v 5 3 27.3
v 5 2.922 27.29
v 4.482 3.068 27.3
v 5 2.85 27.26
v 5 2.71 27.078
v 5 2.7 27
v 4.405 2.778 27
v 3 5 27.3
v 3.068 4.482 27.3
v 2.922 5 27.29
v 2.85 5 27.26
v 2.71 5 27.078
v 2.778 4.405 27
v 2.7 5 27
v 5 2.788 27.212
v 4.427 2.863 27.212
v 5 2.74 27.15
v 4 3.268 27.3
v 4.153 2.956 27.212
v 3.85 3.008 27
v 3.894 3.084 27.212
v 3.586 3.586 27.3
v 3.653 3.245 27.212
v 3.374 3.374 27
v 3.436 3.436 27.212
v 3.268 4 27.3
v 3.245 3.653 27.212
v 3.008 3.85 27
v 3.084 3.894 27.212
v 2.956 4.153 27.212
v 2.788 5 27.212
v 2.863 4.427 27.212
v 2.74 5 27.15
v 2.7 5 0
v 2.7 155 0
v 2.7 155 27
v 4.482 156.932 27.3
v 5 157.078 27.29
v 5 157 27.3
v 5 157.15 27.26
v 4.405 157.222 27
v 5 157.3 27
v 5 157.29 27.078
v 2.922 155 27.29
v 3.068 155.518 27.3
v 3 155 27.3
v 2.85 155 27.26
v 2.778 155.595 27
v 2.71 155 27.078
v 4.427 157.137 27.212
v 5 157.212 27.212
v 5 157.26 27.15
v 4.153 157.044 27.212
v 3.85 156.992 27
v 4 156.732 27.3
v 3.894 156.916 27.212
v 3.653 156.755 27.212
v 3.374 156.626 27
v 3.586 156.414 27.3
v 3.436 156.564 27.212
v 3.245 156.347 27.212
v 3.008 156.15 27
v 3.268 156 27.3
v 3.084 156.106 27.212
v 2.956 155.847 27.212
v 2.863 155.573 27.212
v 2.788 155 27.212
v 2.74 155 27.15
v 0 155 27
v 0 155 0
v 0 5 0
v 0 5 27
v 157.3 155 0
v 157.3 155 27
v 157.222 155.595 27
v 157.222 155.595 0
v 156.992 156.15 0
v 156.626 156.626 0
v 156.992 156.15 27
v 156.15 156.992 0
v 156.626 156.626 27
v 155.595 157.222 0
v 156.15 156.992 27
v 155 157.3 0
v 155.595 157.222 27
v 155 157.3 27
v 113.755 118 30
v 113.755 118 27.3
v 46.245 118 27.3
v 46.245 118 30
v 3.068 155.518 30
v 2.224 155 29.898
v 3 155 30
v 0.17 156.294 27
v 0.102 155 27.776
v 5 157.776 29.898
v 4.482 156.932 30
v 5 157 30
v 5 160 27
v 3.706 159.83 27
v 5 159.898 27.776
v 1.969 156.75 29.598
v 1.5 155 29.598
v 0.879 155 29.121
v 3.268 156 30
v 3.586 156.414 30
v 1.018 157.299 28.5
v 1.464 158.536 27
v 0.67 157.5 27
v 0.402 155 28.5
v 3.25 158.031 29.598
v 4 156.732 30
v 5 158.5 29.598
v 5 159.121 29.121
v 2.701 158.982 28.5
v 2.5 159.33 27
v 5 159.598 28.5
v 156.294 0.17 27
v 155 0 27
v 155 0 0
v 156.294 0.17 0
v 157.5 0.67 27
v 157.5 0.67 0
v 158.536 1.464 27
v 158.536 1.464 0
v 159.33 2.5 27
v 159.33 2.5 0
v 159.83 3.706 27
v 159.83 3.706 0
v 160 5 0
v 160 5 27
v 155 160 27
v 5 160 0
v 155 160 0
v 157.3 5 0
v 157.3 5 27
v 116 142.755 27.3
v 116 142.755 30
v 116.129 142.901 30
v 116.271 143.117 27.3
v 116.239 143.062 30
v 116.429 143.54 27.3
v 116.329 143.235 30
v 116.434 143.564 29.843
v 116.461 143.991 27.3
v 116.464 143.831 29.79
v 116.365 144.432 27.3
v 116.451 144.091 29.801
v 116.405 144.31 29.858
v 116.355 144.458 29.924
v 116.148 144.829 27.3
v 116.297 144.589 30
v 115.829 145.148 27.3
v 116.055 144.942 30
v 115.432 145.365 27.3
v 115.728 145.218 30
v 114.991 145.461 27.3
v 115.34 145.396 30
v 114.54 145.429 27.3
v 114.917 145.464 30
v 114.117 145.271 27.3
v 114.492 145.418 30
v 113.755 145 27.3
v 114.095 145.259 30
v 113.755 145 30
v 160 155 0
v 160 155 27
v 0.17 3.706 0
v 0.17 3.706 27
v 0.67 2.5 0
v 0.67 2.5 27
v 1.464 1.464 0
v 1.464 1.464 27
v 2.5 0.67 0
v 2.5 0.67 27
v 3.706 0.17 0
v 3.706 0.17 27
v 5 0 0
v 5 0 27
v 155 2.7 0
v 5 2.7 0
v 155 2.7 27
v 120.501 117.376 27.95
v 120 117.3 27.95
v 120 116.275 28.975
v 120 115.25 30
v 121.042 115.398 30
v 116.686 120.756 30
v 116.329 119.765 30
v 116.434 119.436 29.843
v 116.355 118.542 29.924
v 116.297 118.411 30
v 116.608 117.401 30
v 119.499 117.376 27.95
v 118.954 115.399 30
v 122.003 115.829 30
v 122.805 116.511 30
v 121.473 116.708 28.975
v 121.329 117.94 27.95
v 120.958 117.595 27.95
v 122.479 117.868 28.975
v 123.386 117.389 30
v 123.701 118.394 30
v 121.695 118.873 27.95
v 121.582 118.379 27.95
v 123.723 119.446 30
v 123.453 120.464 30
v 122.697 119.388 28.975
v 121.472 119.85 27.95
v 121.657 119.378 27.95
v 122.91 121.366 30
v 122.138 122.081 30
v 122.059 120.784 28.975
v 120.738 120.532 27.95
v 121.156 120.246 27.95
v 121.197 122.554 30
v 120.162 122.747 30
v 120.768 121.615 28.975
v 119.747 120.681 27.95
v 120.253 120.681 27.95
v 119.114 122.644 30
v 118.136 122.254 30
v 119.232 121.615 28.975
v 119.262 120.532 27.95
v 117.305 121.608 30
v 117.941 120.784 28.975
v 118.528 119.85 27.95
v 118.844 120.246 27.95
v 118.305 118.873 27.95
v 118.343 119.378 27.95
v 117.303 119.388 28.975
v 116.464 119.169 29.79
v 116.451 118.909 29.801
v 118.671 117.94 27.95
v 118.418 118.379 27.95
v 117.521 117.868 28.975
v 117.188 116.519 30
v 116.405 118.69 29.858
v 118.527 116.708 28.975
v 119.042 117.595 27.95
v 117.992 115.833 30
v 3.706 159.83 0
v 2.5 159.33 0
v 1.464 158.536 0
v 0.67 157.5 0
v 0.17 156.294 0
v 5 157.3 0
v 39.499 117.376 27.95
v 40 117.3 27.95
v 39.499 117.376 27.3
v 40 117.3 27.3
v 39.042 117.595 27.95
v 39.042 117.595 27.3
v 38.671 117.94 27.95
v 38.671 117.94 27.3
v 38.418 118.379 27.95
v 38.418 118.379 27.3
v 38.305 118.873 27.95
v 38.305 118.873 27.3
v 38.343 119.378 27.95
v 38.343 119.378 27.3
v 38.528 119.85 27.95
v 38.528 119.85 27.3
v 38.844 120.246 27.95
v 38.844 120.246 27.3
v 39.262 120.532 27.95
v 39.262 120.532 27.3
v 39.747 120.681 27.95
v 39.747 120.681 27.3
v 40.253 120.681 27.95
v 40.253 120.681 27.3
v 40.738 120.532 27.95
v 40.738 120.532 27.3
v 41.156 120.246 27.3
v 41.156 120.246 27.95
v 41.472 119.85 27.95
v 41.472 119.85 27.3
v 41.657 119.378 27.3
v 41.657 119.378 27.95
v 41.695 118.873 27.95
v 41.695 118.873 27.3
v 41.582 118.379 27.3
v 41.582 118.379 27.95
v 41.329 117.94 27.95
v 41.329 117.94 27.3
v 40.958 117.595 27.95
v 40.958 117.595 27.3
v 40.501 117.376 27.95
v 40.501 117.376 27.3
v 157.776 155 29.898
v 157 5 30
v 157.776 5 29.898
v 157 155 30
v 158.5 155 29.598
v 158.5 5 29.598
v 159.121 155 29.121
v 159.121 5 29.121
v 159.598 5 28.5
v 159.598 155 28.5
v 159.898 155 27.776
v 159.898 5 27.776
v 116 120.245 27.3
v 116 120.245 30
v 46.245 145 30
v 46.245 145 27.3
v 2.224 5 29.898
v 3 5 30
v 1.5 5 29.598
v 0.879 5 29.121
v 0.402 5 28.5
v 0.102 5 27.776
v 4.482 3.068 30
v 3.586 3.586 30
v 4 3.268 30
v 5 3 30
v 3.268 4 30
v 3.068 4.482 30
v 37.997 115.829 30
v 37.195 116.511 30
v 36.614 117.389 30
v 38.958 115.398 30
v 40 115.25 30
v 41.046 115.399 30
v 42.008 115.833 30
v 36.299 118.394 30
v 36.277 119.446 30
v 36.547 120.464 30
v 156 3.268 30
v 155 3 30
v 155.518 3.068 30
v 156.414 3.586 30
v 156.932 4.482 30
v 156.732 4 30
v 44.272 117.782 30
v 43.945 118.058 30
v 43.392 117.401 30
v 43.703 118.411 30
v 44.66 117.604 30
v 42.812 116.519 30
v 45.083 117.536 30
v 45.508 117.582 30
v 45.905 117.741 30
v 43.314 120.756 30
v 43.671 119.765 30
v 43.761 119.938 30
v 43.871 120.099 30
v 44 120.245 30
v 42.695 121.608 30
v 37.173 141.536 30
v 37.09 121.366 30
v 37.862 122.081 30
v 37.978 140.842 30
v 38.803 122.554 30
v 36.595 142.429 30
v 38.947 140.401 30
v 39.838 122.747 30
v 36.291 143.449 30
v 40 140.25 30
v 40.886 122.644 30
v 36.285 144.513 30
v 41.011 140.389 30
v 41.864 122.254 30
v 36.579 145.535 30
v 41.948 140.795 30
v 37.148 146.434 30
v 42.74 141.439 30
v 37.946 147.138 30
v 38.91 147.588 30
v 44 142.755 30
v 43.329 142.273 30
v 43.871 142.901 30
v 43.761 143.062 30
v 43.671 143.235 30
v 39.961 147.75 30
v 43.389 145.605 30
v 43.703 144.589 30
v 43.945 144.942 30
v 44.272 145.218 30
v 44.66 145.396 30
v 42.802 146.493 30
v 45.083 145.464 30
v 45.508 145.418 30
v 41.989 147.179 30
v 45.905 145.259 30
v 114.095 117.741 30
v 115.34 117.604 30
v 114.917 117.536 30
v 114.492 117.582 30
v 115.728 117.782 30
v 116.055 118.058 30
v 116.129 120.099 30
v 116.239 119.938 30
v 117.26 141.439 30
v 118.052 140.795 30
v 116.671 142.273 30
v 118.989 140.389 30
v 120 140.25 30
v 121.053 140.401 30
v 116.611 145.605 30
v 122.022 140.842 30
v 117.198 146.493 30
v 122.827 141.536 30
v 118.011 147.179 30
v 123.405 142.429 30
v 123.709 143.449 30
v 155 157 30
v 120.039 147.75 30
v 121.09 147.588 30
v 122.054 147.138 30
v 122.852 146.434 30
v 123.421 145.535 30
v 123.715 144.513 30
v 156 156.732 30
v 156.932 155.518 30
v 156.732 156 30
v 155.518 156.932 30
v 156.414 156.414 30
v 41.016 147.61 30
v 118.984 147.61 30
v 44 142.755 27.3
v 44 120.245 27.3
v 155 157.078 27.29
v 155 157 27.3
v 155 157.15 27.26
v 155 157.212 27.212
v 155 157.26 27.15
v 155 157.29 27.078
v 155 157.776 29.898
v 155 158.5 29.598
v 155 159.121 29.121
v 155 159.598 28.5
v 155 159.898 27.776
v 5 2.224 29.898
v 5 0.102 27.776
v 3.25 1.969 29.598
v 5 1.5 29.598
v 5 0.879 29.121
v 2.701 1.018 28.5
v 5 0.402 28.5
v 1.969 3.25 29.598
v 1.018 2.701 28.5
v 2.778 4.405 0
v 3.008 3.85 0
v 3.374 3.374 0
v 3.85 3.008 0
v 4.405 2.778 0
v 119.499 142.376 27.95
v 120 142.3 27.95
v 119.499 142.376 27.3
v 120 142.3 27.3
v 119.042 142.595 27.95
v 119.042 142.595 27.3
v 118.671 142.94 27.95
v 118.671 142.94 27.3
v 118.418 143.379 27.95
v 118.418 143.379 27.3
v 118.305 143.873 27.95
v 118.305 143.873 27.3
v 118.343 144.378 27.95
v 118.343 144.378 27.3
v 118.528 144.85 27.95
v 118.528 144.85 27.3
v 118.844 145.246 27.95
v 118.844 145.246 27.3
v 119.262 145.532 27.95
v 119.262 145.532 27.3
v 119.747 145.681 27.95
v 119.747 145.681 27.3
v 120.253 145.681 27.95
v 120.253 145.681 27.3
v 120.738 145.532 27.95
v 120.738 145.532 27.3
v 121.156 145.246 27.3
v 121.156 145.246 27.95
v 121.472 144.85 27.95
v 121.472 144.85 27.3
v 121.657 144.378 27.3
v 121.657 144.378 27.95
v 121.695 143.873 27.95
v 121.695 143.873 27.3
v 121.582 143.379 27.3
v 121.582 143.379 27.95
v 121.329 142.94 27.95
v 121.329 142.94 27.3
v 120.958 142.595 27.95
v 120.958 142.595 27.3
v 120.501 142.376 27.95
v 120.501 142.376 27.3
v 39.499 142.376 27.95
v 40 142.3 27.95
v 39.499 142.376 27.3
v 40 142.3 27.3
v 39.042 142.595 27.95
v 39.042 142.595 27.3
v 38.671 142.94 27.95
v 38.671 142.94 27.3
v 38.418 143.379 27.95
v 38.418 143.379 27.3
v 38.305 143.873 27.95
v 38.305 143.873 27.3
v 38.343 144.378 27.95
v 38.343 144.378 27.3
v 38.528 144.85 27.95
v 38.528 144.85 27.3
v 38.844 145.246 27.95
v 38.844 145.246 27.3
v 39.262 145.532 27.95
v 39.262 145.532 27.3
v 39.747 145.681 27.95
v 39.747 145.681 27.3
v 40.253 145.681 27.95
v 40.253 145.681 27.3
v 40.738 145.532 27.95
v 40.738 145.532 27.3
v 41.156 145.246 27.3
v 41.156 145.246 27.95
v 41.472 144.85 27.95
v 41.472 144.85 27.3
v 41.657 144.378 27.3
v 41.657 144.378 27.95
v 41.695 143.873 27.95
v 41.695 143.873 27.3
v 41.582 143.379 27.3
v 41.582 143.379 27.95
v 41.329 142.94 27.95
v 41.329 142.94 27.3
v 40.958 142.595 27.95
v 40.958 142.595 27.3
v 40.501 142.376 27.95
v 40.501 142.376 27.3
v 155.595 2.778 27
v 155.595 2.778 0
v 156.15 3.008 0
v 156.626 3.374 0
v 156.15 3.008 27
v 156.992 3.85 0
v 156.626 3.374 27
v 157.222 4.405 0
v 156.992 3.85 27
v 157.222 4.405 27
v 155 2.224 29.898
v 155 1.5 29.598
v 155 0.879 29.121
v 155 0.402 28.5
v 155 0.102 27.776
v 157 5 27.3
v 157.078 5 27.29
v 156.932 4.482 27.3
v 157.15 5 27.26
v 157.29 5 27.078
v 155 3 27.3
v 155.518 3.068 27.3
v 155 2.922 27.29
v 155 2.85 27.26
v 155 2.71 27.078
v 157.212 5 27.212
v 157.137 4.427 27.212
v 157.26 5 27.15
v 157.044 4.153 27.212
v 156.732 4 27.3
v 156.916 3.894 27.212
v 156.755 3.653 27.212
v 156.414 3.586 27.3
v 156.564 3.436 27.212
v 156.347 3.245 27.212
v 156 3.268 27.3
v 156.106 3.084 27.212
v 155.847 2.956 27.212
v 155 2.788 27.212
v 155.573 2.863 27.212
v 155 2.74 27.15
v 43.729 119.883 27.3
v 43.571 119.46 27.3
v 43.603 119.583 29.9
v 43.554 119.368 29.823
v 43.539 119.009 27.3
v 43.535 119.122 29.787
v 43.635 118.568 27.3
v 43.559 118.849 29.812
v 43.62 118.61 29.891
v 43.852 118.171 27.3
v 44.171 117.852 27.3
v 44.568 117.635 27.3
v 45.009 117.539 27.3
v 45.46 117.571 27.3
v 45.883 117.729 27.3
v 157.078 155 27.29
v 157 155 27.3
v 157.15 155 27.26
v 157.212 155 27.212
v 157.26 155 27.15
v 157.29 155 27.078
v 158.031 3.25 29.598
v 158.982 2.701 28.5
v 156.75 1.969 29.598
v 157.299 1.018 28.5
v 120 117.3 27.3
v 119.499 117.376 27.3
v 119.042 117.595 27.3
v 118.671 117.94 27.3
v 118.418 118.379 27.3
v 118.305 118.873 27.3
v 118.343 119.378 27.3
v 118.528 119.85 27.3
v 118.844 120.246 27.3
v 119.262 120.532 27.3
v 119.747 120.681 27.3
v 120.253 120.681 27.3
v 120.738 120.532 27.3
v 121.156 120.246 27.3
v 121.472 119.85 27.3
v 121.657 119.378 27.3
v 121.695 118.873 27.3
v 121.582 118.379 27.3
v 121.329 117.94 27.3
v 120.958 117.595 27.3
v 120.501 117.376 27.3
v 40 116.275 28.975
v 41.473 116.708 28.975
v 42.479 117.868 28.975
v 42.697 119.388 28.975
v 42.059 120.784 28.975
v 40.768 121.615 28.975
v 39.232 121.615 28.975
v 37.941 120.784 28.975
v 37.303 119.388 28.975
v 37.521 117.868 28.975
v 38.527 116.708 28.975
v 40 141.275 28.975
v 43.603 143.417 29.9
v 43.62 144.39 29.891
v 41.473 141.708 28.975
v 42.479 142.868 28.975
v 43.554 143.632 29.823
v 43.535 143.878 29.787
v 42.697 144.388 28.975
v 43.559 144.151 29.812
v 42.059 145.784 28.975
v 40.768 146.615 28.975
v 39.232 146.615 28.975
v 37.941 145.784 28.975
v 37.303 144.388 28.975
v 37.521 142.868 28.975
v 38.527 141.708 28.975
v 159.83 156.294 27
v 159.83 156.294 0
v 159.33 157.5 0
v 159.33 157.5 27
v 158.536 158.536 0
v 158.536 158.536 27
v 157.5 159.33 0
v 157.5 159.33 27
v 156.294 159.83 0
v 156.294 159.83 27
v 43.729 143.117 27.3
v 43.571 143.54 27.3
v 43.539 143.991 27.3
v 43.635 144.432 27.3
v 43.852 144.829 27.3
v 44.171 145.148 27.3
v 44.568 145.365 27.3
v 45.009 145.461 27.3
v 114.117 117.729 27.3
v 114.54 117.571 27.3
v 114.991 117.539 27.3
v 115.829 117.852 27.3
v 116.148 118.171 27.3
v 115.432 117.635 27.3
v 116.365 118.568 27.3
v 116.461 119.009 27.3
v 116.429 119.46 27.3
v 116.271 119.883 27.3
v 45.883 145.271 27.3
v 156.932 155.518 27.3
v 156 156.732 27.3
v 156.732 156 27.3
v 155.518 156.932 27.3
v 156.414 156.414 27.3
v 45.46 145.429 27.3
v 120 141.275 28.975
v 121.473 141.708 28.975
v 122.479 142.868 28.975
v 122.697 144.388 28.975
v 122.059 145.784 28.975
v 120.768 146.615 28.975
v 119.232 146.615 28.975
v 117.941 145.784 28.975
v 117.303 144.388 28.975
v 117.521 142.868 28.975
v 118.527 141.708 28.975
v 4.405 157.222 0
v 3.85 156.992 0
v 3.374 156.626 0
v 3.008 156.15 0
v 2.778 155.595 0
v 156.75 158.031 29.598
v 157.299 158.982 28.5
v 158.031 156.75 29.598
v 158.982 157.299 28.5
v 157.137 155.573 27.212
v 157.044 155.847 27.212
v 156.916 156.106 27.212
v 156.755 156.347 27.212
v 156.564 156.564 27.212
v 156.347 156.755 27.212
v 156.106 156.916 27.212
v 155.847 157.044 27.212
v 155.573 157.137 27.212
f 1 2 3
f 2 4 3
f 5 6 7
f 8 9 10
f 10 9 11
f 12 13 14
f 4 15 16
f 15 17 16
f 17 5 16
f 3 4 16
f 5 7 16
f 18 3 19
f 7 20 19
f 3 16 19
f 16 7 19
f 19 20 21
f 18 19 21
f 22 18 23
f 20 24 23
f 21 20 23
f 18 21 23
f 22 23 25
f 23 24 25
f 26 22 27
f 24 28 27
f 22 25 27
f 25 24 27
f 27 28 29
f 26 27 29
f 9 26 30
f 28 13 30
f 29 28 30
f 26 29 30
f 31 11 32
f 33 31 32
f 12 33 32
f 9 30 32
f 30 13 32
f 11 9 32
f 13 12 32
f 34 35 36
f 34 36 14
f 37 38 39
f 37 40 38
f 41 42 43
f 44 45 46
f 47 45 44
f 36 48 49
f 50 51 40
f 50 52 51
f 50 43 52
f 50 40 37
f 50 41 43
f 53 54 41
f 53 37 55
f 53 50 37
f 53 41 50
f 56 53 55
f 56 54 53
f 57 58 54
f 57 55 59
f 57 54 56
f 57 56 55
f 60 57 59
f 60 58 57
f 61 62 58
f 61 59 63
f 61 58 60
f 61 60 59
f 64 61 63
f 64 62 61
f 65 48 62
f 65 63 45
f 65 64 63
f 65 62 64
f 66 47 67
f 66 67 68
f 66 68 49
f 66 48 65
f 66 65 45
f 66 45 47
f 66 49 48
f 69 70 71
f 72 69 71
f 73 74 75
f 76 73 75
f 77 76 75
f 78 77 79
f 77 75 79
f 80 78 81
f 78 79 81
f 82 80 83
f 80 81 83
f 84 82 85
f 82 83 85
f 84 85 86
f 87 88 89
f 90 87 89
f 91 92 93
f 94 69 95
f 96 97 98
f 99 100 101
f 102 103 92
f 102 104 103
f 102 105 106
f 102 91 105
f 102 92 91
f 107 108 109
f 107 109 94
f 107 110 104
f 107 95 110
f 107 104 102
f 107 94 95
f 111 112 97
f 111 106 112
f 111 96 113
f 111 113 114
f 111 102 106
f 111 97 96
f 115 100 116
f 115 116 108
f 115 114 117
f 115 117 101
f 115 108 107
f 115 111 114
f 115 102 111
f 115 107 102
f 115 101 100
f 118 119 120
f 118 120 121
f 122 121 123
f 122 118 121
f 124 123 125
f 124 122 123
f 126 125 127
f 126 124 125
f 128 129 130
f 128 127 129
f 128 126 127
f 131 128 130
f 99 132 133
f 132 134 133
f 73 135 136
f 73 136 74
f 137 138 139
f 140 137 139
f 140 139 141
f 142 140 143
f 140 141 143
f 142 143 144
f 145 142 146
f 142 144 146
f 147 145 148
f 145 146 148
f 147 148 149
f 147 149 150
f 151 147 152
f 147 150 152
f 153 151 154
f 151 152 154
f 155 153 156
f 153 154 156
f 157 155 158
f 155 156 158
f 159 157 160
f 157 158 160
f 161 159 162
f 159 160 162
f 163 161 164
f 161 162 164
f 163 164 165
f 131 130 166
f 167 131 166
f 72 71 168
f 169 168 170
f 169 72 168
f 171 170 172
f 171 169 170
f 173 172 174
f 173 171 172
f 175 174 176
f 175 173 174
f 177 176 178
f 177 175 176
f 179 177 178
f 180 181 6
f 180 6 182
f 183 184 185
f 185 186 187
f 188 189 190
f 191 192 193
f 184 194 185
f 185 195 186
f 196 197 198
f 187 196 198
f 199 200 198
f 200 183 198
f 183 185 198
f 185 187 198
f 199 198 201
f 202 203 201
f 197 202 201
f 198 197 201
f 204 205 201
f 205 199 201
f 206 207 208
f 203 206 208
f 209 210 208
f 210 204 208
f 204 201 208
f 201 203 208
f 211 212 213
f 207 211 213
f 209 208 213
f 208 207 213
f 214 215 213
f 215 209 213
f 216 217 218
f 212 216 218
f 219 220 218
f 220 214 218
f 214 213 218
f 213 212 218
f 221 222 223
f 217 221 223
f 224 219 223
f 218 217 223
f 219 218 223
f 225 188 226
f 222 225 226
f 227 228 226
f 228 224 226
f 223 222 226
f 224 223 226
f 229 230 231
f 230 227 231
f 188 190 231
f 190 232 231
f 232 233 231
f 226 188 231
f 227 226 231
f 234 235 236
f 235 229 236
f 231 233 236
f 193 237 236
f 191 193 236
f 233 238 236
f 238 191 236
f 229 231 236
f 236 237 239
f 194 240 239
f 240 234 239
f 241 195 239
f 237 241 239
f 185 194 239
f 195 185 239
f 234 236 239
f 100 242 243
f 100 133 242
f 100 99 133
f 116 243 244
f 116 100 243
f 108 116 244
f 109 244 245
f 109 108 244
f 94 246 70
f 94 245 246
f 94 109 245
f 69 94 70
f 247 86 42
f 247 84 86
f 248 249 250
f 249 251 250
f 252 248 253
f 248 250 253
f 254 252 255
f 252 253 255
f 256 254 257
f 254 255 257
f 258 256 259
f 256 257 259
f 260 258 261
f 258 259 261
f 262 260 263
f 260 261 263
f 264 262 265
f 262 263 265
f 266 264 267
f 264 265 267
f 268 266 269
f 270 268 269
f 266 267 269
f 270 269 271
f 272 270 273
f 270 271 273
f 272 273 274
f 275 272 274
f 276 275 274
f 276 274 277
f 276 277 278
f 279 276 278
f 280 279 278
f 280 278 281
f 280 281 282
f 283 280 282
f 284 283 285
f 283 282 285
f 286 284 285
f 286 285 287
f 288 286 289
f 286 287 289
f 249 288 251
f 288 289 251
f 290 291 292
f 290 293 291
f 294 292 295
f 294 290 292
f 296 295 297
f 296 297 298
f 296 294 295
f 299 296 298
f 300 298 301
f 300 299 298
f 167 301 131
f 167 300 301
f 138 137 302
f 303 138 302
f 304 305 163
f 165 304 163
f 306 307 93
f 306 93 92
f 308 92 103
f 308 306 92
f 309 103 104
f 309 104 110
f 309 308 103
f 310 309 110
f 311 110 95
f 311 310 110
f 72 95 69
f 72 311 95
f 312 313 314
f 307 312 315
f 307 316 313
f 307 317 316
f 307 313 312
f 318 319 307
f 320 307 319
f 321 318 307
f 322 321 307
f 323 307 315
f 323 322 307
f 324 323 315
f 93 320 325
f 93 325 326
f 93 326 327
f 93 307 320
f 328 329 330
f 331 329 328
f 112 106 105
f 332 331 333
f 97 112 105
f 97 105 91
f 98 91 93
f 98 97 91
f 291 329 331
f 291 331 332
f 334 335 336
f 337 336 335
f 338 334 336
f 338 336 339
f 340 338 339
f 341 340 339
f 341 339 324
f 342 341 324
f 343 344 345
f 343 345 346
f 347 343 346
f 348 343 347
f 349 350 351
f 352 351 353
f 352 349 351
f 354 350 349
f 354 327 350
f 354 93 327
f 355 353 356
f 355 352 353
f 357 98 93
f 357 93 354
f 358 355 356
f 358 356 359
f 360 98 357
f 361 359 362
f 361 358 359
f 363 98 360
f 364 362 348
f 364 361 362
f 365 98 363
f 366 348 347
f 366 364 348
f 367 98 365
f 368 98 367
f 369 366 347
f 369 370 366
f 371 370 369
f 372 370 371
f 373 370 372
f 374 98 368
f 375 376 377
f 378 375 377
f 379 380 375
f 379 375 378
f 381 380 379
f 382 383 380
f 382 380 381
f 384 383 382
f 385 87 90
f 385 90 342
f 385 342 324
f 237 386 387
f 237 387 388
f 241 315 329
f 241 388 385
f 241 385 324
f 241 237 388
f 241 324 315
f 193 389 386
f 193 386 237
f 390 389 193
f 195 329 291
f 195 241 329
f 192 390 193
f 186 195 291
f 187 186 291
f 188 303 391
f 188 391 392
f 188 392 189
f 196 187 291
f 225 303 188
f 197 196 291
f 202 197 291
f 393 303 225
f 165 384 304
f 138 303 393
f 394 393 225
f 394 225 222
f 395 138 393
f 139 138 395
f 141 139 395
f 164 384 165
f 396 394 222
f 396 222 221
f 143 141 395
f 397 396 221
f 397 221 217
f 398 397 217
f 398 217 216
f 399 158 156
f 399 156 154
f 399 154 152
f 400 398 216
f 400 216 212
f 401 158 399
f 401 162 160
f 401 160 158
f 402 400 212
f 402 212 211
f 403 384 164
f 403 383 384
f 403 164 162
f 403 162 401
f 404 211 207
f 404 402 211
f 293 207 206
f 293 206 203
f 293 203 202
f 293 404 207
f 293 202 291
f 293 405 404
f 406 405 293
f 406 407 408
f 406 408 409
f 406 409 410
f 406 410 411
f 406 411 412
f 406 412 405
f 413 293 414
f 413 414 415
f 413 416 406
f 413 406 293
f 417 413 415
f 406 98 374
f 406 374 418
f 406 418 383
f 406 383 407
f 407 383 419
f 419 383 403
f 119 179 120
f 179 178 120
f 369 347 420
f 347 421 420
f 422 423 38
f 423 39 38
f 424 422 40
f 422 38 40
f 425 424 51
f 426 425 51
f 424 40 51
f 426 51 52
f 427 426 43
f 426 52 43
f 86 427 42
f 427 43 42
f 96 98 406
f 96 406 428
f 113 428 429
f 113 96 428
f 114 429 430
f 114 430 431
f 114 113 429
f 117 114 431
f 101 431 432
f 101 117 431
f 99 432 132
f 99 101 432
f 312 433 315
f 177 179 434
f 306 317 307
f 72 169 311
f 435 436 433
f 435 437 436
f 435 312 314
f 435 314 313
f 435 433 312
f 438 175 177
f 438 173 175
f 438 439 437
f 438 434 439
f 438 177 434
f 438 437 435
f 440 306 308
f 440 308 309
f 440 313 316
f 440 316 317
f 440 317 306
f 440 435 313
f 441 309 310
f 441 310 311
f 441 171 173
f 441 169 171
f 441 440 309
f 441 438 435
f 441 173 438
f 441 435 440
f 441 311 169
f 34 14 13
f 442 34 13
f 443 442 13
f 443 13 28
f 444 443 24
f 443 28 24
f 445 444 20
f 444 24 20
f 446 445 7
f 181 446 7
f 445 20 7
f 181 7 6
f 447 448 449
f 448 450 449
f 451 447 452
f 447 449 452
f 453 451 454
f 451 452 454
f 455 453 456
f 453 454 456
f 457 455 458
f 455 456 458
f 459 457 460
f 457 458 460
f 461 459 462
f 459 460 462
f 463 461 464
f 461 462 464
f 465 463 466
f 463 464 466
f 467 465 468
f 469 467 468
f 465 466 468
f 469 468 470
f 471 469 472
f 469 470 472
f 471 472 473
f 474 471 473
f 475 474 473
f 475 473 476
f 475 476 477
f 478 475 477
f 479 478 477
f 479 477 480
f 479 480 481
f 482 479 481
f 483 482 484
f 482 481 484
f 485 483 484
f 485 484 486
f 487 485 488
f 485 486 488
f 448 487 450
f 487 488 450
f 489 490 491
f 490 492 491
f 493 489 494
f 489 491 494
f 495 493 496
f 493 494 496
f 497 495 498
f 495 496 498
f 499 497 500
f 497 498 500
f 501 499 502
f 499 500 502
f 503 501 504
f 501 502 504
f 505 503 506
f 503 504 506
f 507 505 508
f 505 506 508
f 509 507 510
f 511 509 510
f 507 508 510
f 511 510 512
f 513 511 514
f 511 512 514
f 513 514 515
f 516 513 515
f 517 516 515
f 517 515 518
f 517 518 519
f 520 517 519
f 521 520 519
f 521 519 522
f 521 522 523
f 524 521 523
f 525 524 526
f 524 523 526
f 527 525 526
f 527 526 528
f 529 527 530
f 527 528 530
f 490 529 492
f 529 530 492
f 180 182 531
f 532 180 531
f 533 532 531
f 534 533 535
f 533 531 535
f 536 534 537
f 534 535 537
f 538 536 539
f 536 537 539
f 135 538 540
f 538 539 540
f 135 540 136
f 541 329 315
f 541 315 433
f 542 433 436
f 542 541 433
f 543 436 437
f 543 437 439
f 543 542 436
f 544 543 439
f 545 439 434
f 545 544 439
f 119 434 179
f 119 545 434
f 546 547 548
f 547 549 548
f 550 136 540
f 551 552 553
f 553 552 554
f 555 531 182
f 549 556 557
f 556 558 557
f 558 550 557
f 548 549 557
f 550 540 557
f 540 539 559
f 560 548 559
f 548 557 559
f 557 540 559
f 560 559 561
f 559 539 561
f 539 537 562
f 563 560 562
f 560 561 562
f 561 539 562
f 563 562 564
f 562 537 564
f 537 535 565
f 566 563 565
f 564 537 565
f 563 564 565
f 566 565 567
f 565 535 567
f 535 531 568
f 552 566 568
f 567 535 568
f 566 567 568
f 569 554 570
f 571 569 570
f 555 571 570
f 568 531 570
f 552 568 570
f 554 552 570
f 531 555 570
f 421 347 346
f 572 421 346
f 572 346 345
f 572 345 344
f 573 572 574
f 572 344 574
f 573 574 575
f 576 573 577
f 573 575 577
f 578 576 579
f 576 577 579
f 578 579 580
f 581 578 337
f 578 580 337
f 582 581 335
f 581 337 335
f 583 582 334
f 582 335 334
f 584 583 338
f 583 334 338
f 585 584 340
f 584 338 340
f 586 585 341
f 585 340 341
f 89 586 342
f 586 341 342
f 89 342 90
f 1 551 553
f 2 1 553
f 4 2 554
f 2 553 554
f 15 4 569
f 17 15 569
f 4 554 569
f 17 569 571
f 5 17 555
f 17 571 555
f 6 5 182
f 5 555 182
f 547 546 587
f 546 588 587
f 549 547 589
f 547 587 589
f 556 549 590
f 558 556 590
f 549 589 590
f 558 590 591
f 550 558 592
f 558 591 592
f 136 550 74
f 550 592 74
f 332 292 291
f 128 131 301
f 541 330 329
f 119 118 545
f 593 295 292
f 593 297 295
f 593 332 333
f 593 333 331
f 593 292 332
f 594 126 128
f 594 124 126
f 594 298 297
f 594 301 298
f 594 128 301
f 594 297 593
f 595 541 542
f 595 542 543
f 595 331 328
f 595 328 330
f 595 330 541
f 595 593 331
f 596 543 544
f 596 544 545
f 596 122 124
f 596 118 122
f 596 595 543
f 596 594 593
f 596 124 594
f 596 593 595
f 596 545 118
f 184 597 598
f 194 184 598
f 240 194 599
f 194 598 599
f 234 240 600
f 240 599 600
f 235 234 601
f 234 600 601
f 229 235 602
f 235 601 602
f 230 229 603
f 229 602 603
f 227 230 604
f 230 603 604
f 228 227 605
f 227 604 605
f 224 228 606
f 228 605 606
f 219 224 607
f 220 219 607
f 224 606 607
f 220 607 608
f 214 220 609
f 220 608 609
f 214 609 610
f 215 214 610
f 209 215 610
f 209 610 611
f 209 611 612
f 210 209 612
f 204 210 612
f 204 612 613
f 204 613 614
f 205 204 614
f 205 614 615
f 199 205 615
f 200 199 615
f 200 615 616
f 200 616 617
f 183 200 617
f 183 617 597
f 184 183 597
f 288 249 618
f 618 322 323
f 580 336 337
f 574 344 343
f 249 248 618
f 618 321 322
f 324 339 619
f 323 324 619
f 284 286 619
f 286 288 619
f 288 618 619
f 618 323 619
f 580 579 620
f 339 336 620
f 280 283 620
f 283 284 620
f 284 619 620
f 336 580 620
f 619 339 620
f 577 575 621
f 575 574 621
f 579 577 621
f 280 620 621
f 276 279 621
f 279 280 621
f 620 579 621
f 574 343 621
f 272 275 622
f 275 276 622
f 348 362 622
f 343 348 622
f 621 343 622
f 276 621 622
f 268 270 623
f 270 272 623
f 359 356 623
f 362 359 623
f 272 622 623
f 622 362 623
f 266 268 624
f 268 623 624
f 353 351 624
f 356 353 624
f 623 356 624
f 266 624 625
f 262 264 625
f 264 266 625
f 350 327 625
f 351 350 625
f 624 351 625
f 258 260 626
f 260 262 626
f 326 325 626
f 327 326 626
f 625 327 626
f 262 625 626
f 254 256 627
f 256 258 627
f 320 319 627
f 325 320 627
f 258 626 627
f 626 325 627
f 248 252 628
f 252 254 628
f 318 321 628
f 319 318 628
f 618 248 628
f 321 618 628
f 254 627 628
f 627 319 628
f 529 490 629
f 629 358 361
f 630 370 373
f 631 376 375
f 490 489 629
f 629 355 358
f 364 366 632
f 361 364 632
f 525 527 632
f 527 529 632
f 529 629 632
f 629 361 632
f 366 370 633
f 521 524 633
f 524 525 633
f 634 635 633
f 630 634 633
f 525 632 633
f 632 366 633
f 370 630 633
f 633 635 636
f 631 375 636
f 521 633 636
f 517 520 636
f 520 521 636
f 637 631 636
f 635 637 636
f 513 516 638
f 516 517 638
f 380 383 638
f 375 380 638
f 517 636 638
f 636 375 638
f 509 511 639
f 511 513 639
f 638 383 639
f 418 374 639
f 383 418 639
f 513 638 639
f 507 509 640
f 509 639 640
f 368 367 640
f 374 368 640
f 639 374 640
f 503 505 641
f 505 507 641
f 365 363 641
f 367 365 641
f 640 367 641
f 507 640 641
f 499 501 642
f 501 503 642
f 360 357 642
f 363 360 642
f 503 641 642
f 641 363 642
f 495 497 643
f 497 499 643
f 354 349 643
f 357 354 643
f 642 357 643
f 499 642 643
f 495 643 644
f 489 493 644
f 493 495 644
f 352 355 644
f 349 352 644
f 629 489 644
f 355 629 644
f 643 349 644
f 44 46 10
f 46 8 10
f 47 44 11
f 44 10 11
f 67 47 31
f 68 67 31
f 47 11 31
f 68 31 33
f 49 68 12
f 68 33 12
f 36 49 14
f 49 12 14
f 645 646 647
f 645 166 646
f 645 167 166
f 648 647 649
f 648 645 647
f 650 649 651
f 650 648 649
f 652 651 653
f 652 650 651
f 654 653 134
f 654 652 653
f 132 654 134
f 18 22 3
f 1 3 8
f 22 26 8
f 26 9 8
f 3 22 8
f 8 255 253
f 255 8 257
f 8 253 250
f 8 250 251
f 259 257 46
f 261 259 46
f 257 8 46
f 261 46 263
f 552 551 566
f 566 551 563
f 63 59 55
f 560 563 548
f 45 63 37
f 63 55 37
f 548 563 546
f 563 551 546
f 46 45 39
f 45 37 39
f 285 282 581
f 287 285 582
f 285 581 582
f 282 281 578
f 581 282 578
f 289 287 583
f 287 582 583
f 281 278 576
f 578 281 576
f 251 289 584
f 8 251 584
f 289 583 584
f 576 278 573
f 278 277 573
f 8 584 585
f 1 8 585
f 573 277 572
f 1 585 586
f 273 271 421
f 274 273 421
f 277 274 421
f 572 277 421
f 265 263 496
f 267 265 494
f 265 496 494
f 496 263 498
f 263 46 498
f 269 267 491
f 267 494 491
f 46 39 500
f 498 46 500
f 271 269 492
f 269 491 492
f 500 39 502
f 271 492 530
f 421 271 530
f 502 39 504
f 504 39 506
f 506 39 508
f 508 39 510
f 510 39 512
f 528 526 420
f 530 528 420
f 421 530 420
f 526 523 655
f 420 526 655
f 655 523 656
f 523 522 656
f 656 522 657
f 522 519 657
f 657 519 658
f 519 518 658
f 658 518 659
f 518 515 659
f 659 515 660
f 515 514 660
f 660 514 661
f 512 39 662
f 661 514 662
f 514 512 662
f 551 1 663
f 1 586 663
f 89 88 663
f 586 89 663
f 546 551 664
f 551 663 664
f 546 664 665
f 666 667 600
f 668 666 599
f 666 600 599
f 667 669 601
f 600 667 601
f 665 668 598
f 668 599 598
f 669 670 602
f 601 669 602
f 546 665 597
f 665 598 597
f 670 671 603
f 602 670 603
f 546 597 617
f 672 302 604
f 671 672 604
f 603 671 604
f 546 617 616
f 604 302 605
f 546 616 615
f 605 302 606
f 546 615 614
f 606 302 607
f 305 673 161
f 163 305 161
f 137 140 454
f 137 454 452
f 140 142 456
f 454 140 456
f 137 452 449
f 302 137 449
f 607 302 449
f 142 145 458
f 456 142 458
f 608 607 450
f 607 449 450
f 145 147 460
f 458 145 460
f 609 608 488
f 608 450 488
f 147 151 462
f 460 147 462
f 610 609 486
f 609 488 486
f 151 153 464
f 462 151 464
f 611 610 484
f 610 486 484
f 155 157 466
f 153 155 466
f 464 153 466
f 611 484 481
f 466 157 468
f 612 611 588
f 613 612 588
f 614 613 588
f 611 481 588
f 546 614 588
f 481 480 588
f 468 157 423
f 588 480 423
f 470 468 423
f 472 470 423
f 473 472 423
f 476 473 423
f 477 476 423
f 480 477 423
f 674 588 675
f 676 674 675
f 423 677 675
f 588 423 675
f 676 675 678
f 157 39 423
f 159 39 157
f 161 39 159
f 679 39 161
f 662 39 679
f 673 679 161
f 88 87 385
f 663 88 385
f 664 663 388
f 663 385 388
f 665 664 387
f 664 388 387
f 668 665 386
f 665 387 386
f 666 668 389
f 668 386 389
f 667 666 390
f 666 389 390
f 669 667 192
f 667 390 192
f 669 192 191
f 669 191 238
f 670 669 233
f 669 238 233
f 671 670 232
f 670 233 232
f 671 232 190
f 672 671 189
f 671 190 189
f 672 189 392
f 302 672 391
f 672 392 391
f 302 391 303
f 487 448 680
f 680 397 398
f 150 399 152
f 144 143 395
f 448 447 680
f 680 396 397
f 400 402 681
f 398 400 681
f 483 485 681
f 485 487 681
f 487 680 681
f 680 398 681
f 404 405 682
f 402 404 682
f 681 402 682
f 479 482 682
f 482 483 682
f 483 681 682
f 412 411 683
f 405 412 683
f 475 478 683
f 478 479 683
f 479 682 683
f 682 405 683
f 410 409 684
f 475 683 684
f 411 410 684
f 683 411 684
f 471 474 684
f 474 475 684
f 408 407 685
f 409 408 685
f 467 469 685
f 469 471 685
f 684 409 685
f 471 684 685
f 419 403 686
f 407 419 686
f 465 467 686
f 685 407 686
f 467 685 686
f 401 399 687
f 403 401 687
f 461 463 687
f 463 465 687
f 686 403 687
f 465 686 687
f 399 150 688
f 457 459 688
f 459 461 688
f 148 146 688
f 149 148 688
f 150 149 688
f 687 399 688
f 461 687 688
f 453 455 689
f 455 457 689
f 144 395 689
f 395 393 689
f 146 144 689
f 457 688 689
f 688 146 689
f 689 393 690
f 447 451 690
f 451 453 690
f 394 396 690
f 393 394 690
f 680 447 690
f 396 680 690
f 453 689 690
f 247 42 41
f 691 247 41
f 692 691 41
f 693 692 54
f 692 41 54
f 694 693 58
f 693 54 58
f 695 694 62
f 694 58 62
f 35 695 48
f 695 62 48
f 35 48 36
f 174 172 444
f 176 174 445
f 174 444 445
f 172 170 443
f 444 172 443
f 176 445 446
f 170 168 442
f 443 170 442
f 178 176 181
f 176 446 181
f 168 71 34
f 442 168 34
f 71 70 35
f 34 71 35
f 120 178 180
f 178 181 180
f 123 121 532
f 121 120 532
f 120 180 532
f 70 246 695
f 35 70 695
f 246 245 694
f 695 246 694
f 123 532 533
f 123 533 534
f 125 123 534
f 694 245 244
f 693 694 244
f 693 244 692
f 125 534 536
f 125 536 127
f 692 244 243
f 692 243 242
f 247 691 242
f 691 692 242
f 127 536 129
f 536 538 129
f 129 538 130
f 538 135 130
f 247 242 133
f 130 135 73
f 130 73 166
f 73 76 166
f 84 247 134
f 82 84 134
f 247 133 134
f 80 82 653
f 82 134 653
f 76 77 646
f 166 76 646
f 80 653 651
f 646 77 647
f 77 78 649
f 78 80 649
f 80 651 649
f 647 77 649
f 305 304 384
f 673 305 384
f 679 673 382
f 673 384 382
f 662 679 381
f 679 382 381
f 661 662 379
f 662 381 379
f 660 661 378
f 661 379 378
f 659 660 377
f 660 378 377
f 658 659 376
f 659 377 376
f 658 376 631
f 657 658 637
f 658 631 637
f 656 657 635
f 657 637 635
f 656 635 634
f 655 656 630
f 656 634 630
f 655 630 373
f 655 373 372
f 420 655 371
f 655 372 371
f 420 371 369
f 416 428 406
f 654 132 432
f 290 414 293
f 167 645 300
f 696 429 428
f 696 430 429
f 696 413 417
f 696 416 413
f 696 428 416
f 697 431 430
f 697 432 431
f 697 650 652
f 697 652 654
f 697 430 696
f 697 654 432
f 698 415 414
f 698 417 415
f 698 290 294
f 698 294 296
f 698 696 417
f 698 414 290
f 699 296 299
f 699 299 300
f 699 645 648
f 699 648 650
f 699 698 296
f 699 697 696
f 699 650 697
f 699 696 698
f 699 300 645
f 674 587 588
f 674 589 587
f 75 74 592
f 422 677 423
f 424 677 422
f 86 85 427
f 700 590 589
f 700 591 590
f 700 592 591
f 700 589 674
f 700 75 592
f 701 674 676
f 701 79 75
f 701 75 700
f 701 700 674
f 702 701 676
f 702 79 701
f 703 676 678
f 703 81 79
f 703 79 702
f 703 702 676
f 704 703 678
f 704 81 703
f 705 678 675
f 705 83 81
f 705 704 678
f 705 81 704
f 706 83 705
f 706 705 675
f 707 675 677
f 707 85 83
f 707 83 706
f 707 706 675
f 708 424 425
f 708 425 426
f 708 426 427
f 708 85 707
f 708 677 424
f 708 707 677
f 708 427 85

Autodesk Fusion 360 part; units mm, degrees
sketch "Sketch1" plane through (0, 0, 0) normal (0, 0, 1) x (1, 0, 0)
  line L0 (0, 0) -> (160, 0)
  line L1 (160, 0) -> (160, 160)
  line L2 (160, 160) -> (0, 160)
  line L3 (0, 160) -> (0, 0)
  dimension "d1" = 160
  dimension "d3" = 160
extrude "Extrude1" add sketch "Sketch1" along normal blind 30
fillet "Fillet1" radius 5 4 edges at (0, 160, 15) (0, 0, 15) (160, 0, 15) (160, 160, 15)
fillet "Fillet1" radius 3 4 edges at (160, 80, 30) (80, 160, 30) (80, 0, 30) (0, 80, 30)
shell "Shell1" thickness 2.7 removed faces 1 at (53.3333, 51.6667, 0)
sketch "Sketch3" plane through (0, 0, 30) normal (0, 0, 1) x (-1, 0, 0)
  arc A0 (-5, -157) -> (-3, -155) centre (-5, -155) ccw
  line L0 (-3, -155) -> (-3, -5)
  arc A1 (-3, -5) -> (-5, -3) centre (-5, -5) ccw
  line L1 (-5, -3) -> (-155, -3)
  arc A2 (-155, -3) -> (-157, -5) centre (-155, -5) ccw
  line L2 (-157, -5) -> (-157, -155)
  arc A3 (-157, -155) -> (-155, -157) centre (-155, -155) ccw
  line L3 (-155, -157) -> (-5, -157)
  line L4 (-44, -145) -> (-116, -145)
  line L5 (-116, -145) -> (-116, -118)
  line L6 (-116, -118) -> (-44, -118)
  line L7 (-44, -118) -> (-44, -145)
  arc A4 (-155, 0) -> (-160, -5) centre (-155, -5) ccw
  line L8 (-160, -5) -> (-160, -155)
  arc A5 (-160, -155) -> (-155, -160) centre (-155, -155) ccw
  line L9 (-155, -160) -> (-5, -160)
  arc A6 (-5, -160) -> (0, -155) centre (-5, -155) ccw
  line L10 (0, -155) -> (0, -5)
  arc A7 (0, -5) -> (-5, 0) centre (-5, -5) ccw
  line L11 (-5, 0) -> (-155, 0)
  line L12 (-80, -145) -> (-80, -160) construction
  dimension "d11" = 72
  dimension "d12" = 27
  dimension "d13" = 15
extrude "Extrude2" cut sketch "Sketch3" along normal through all and the other way through all contours L4 L5 L6 L7
sketch "Sketch4" plane through (0, 0, 30) normal (0, 0, 1) x (-1, 0, 0)
  line L0 (-44, -145) -> (-44, -118)
  line L1 (-44, -118) -> (-116, -118)
  line L2 (-116, -118) -> (-116, -145)
  line L3 (-116, -145) -> (-44, -145)
  arc A0 (-155, 0) -> (-160, -5) centre (-155, -5) ccw
  line L4 (-160, -5) -> (-160, -155)
  arc A1 (-160, -155) -> (-155, -160) centre (-155, -155) ccw
  line L5 (-155, -160) -> (-5, -160)
  arc A2 (-5, -160) -> (0, -155) centre (-5, -155) ccw
  line L6 (0, -155) -> (0, -5)
  arc A3 (0, -5) -> (-5, 0) centre (-5, -5) ccw
  line L7 (-5, 0) -> (-155, 0)
  line L8 (-40, -144) -> (-120, -144)
  line L9 (-120, -144) -> (-120, -119)
  line L10 (-120, -119) -> (-40, -119)
  line L11 (-40, -119) -> (-40, -144)
  line L12 (-44, -131.5) -> (-40, -131.5)
  line L13 (-80, -144) -> (-80, -145)
  line L14 (-80, -118) -> (-80, -119)
  line L15 (-116, -131.5) -> (-120, -131.5)
  dimension "d31" = 80
  dimension "d32" = 25
sketch "Sketch5" plane through (0, 0, 30) normal (0, 0, 1) x (-1, 0, 0)
  line L0 (-44, -118) -> (-44, -145)
  line L1 (-44, -145) -> (-116, -145)
  line L2 (-116, -145) -> (-116, -118)
  line L3 (-116, -118) -> (-44, -118)
  arc A0 (-5, -157) -> (-3, -155) centre (-5, -155) ccw
  line L4 (-3, -155) -> (-3, -5)
  arc A1 (-3, -5) -> (-5, -3) centre (-5, -5) ccw
  line L5 (-5, -3) -> (-155, -3)
  arc A2 (-155, -3) -> (-157, -5) centre (-155, -5) ccw
  line L6 (-157, -5) -> (-157, -155)
  arc A3 (-157, -155) -> (-155, -157) centre (-155, -155) ccw
  line L7 (-155, -157) -> (-5, -157)
  circle A4 centre (-45.1225, -143.8775) radius 1.5875
  line L8 (-44, -145) -> (-45.1225, -143.8775)
  circle A5 centre (-114.8775, -143.8775) radius 1.5875
  line L9 (-116, -145) -> (-114.8775, -143.8775) construction
  dimension "d23" = 3.175
  dimension "d24" = 45
  dimension "d25" = 3.175
extrude "Extrude3" cut sketch "Sketch5" along normal through all and the other way through all contours L0 A4 | L0 L1 A4 | L1 A4 | L1 L2 A5 | L2 A5 | L1 A5
ref_plane "WorkPlane1" through (80, 131.5, 28.65) normal (0, -1, 0) x (-1, 0, 0)
mirror "Mirror1" about plane through (80, 131.5, 28.65) normal (0, -1, 0) of "Extrude3"
fillet "Fillet2" [suppressed]
hole "Hole1" at (120, 144, 30) at (120, 119, 30) at (40, 119, 30) at (40, 144, 30) direction (0, 0, -1) diameter 3.4 depth 15 tip angle 118 countersink diameter 7.5 countersink angle 90
equation "d1 = Lid_X"
equation "d3 = Lid_Y"
equation "d4 = Lid_Z"
equation "d8 = Lid_Thikness"
equation "d11 = Opening_X"
equation "d12 = Opening_Y"
equation "d23 = d25"
equation "d25 = dog_bone_DIA"
equation "d30 = Corner_rad"
equation "d31 = Holes_X"
equation "d32 = Holes_Y"
equation "Lid_X = 160 mm"
equation "Lid_Y = 160 mm"
equation "Lid_Z = 30 mm"
equation "Opening_X = 72 mm"
equation "Opening_Y = 27 mm"
equation "Lid_Thikness = 2.7 mm"
equation "Corner_rad = 0.793 mm"
equation "Holes_X = 80 mm"
equation "Holes_Y = 25 mm"
equation "dog_bone_DIA = 0'- 1/8\""
